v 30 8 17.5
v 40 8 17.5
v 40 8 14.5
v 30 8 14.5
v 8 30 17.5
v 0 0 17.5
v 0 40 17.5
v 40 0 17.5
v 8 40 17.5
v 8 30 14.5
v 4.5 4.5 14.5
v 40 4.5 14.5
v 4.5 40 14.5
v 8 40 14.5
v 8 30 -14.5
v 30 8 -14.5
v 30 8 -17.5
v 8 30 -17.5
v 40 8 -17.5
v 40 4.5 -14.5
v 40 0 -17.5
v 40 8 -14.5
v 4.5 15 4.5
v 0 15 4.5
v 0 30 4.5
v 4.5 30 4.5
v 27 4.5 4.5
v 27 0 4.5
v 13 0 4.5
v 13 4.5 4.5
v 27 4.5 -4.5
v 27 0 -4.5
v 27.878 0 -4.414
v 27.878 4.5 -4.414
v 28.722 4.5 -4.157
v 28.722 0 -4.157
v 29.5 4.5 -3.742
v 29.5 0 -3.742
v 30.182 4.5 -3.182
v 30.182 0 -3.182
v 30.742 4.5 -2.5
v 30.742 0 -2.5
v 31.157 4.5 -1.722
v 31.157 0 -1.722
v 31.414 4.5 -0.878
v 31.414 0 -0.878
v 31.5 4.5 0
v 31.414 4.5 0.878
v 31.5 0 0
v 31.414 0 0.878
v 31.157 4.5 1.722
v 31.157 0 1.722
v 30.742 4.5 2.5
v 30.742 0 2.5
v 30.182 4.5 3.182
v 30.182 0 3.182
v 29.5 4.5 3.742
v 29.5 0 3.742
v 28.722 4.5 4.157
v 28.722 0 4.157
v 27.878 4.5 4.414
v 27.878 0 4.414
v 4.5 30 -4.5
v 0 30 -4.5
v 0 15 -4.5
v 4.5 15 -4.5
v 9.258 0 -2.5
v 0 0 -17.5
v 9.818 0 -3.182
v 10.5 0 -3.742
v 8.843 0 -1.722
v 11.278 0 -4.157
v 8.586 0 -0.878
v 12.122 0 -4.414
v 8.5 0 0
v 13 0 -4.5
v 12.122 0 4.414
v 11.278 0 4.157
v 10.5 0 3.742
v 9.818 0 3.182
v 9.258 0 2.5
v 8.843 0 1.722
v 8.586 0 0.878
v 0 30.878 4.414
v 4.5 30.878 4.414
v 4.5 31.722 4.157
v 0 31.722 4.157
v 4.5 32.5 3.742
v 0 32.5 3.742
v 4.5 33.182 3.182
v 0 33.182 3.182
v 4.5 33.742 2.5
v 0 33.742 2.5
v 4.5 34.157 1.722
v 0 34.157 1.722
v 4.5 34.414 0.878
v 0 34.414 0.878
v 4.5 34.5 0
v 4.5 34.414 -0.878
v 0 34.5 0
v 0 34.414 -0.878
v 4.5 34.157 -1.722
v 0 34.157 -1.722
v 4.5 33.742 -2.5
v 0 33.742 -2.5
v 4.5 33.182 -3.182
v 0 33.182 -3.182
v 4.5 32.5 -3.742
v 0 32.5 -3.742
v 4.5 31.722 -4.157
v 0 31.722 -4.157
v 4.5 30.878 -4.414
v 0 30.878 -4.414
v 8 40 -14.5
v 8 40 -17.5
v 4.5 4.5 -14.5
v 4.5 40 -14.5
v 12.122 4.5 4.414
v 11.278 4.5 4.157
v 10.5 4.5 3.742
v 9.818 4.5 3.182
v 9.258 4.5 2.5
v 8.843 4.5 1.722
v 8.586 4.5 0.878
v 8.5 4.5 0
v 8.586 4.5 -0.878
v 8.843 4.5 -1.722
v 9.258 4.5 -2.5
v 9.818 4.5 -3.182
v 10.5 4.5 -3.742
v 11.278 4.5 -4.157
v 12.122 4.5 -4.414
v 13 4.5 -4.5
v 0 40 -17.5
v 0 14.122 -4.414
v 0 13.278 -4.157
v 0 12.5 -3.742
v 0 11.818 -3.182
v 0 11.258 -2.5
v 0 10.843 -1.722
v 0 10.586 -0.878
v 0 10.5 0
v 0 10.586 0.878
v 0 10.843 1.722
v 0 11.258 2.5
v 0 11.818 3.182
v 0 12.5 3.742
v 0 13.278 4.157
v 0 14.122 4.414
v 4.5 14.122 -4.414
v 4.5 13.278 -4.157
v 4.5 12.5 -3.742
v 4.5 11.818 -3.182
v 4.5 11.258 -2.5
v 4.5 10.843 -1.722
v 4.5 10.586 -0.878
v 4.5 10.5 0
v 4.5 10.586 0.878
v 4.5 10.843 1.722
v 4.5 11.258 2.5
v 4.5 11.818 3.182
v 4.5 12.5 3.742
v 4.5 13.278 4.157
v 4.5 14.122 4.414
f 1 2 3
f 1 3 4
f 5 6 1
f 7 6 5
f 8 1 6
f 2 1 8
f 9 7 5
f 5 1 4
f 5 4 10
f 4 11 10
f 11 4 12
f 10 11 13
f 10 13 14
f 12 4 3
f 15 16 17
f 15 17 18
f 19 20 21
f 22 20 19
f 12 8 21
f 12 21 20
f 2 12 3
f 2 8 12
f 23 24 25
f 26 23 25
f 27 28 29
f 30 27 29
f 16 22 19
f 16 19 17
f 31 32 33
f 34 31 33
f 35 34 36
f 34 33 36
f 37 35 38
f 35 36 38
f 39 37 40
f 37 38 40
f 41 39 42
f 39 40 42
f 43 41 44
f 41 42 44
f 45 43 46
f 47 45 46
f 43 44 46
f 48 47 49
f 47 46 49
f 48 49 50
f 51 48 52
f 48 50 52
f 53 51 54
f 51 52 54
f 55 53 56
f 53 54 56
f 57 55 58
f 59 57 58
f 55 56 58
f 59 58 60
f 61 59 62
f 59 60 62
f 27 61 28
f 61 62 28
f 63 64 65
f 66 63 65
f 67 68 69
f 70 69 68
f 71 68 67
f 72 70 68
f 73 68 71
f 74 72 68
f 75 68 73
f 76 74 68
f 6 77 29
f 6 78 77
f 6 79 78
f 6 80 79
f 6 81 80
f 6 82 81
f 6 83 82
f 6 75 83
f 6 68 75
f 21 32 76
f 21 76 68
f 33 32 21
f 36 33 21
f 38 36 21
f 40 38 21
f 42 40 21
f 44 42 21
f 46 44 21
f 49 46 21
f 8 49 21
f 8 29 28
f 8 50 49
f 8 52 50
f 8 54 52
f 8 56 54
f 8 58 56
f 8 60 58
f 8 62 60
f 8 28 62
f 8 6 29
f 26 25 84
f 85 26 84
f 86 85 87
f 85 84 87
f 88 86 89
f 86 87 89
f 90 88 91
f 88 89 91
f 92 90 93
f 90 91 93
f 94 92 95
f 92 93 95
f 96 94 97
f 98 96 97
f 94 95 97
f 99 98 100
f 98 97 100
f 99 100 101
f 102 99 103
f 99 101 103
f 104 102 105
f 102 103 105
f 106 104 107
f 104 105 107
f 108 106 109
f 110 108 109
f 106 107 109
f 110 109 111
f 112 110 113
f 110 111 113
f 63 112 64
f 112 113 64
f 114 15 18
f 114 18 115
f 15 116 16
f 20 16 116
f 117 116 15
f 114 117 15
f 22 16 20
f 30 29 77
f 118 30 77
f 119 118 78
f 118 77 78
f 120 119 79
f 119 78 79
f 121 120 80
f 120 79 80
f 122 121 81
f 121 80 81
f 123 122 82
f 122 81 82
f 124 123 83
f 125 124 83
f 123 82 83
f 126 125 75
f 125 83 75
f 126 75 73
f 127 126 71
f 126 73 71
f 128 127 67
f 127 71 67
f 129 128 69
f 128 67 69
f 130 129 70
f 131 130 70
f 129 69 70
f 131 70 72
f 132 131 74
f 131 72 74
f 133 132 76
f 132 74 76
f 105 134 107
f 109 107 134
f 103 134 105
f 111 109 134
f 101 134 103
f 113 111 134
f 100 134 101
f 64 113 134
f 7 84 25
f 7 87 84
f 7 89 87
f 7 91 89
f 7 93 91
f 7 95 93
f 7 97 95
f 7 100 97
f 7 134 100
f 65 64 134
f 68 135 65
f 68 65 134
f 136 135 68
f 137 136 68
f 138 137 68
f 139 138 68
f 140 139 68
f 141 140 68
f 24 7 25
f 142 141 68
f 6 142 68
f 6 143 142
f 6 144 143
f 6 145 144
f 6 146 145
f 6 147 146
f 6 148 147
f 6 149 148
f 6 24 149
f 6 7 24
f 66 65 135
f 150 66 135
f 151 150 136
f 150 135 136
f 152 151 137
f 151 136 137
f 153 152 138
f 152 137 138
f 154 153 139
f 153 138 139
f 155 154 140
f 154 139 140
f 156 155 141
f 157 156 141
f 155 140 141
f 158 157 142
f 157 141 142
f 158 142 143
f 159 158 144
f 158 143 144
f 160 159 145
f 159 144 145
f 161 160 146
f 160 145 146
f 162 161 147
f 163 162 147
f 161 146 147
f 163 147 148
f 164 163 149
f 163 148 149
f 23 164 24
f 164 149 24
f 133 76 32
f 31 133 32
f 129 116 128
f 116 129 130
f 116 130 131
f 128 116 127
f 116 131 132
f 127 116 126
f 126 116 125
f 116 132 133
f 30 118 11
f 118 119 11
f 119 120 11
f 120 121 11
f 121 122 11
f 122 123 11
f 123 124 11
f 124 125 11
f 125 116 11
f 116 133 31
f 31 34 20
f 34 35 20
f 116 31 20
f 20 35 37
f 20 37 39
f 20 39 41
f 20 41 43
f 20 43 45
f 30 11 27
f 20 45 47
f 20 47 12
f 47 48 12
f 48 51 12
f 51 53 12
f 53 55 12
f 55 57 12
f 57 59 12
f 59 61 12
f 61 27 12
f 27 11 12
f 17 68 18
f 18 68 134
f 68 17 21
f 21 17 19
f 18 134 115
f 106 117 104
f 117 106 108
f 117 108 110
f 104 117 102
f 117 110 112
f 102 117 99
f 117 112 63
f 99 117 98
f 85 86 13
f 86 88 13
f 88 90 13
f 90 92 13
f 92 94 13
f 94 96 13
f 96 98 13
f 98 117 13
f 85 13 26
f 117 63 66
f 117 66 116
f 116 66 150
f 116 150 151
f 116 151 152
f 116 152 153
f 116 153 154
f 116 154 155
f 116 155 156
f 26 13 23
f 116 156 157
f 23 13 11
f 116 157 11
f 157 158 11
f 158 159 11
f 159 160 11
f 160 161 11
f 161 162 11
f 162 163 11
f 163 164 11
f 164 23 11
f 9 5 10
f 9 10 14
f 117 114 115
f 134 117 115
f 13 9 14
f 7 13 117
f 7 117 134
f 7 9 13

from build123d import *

# Parameters (mm, degrees)
EXTRUDE_1_DEPTH     = 17.5
CUT_EXTRUDE_1_DEPTH = 14.5
CUT_EXTRUDE_2_REACH = 42
CUT_EXTRUDE_3_REACH = 42


with BuildPart() as part:
    # 草图1 → 凸台-拉伸1 (new body, symmetric)
    with BuildSketch(Plane.XY):
        Polygon((0, 40), (0, 0), (40, 0), (40, 8), (30, 8), (8, 30), (8, 40), align=None)
    extrude(amount=EXTRUDE_1_DEPTH, both=True)

    # 草图2 → 切除-拉伸1 (cut, symmetric)
    with BuildSketch(Plane.XY):
        Polygon((4.5, 40), (4.5, 4.5), (40, 4.5), (40, 8), (8, 40), align=None)
    extrude(amount=CUT_EXTRUDE_1_DEPTH, both=True, mode=Mode.SUBTRACT)

    # 草图3 → 切除-拉伸2 (cut, up to next)
    with BuildSketch(Plane.XZ, mode=Mode.PRIVATE) as cut_extrude_2_sk1:
        with BuildLine():
            Line((13, -4.5), (27, -4.5))
            ThreePointArc((27, -4.5), (31.5, 0), (27, 4.5))
            Line((27, 4.5), (13, 4.5))
            ThreePointArc((13, 4.5), (8.5, 0), (13, -4.5))
        make_face()
    cut_extrude_2_tool1 = extrude(cut_extrude_2_sk1.sketch, amount=-CUT_EXTRUDE_2_REACH, mode=Mode.PRIVATE) & part.part
    add(cut_extrude_2_tool1.solids().sort_by_distance((20, 0, 0))[0], mode=Mode.SUBTRACT)

    # 草图4 → 切除-拉伸3 (cut, up to next)
    with BuildSketch(Plane.ZY, mode=Mode.PRIVATE) as cut_extrude_3_sk1:
        with BuildLine():
            Line((4.5, 15), (4.5, 30))
            ThreePointArc((4.5, 30), (0, 34.5), (-4.5, 30))
            Line((-4.5, 30), (-4.5, 15))
            ThreePointArc((-4.5, 15), (0, 10.5), (4.5, 15))
        make_face()
    cut_extrude_3_tool1 = extrude(cut_extrude_3_sk1.sketch, amount=-CUT_EXTRUDE_3_REACH, mode=Mode.PRIVATE) & part.part
    add(cut_extrude_3_tool1.solids().sort_by_distance((0, 22.5, 0))[0], mode=Mode.SUBTRACT)


solid = part.part
